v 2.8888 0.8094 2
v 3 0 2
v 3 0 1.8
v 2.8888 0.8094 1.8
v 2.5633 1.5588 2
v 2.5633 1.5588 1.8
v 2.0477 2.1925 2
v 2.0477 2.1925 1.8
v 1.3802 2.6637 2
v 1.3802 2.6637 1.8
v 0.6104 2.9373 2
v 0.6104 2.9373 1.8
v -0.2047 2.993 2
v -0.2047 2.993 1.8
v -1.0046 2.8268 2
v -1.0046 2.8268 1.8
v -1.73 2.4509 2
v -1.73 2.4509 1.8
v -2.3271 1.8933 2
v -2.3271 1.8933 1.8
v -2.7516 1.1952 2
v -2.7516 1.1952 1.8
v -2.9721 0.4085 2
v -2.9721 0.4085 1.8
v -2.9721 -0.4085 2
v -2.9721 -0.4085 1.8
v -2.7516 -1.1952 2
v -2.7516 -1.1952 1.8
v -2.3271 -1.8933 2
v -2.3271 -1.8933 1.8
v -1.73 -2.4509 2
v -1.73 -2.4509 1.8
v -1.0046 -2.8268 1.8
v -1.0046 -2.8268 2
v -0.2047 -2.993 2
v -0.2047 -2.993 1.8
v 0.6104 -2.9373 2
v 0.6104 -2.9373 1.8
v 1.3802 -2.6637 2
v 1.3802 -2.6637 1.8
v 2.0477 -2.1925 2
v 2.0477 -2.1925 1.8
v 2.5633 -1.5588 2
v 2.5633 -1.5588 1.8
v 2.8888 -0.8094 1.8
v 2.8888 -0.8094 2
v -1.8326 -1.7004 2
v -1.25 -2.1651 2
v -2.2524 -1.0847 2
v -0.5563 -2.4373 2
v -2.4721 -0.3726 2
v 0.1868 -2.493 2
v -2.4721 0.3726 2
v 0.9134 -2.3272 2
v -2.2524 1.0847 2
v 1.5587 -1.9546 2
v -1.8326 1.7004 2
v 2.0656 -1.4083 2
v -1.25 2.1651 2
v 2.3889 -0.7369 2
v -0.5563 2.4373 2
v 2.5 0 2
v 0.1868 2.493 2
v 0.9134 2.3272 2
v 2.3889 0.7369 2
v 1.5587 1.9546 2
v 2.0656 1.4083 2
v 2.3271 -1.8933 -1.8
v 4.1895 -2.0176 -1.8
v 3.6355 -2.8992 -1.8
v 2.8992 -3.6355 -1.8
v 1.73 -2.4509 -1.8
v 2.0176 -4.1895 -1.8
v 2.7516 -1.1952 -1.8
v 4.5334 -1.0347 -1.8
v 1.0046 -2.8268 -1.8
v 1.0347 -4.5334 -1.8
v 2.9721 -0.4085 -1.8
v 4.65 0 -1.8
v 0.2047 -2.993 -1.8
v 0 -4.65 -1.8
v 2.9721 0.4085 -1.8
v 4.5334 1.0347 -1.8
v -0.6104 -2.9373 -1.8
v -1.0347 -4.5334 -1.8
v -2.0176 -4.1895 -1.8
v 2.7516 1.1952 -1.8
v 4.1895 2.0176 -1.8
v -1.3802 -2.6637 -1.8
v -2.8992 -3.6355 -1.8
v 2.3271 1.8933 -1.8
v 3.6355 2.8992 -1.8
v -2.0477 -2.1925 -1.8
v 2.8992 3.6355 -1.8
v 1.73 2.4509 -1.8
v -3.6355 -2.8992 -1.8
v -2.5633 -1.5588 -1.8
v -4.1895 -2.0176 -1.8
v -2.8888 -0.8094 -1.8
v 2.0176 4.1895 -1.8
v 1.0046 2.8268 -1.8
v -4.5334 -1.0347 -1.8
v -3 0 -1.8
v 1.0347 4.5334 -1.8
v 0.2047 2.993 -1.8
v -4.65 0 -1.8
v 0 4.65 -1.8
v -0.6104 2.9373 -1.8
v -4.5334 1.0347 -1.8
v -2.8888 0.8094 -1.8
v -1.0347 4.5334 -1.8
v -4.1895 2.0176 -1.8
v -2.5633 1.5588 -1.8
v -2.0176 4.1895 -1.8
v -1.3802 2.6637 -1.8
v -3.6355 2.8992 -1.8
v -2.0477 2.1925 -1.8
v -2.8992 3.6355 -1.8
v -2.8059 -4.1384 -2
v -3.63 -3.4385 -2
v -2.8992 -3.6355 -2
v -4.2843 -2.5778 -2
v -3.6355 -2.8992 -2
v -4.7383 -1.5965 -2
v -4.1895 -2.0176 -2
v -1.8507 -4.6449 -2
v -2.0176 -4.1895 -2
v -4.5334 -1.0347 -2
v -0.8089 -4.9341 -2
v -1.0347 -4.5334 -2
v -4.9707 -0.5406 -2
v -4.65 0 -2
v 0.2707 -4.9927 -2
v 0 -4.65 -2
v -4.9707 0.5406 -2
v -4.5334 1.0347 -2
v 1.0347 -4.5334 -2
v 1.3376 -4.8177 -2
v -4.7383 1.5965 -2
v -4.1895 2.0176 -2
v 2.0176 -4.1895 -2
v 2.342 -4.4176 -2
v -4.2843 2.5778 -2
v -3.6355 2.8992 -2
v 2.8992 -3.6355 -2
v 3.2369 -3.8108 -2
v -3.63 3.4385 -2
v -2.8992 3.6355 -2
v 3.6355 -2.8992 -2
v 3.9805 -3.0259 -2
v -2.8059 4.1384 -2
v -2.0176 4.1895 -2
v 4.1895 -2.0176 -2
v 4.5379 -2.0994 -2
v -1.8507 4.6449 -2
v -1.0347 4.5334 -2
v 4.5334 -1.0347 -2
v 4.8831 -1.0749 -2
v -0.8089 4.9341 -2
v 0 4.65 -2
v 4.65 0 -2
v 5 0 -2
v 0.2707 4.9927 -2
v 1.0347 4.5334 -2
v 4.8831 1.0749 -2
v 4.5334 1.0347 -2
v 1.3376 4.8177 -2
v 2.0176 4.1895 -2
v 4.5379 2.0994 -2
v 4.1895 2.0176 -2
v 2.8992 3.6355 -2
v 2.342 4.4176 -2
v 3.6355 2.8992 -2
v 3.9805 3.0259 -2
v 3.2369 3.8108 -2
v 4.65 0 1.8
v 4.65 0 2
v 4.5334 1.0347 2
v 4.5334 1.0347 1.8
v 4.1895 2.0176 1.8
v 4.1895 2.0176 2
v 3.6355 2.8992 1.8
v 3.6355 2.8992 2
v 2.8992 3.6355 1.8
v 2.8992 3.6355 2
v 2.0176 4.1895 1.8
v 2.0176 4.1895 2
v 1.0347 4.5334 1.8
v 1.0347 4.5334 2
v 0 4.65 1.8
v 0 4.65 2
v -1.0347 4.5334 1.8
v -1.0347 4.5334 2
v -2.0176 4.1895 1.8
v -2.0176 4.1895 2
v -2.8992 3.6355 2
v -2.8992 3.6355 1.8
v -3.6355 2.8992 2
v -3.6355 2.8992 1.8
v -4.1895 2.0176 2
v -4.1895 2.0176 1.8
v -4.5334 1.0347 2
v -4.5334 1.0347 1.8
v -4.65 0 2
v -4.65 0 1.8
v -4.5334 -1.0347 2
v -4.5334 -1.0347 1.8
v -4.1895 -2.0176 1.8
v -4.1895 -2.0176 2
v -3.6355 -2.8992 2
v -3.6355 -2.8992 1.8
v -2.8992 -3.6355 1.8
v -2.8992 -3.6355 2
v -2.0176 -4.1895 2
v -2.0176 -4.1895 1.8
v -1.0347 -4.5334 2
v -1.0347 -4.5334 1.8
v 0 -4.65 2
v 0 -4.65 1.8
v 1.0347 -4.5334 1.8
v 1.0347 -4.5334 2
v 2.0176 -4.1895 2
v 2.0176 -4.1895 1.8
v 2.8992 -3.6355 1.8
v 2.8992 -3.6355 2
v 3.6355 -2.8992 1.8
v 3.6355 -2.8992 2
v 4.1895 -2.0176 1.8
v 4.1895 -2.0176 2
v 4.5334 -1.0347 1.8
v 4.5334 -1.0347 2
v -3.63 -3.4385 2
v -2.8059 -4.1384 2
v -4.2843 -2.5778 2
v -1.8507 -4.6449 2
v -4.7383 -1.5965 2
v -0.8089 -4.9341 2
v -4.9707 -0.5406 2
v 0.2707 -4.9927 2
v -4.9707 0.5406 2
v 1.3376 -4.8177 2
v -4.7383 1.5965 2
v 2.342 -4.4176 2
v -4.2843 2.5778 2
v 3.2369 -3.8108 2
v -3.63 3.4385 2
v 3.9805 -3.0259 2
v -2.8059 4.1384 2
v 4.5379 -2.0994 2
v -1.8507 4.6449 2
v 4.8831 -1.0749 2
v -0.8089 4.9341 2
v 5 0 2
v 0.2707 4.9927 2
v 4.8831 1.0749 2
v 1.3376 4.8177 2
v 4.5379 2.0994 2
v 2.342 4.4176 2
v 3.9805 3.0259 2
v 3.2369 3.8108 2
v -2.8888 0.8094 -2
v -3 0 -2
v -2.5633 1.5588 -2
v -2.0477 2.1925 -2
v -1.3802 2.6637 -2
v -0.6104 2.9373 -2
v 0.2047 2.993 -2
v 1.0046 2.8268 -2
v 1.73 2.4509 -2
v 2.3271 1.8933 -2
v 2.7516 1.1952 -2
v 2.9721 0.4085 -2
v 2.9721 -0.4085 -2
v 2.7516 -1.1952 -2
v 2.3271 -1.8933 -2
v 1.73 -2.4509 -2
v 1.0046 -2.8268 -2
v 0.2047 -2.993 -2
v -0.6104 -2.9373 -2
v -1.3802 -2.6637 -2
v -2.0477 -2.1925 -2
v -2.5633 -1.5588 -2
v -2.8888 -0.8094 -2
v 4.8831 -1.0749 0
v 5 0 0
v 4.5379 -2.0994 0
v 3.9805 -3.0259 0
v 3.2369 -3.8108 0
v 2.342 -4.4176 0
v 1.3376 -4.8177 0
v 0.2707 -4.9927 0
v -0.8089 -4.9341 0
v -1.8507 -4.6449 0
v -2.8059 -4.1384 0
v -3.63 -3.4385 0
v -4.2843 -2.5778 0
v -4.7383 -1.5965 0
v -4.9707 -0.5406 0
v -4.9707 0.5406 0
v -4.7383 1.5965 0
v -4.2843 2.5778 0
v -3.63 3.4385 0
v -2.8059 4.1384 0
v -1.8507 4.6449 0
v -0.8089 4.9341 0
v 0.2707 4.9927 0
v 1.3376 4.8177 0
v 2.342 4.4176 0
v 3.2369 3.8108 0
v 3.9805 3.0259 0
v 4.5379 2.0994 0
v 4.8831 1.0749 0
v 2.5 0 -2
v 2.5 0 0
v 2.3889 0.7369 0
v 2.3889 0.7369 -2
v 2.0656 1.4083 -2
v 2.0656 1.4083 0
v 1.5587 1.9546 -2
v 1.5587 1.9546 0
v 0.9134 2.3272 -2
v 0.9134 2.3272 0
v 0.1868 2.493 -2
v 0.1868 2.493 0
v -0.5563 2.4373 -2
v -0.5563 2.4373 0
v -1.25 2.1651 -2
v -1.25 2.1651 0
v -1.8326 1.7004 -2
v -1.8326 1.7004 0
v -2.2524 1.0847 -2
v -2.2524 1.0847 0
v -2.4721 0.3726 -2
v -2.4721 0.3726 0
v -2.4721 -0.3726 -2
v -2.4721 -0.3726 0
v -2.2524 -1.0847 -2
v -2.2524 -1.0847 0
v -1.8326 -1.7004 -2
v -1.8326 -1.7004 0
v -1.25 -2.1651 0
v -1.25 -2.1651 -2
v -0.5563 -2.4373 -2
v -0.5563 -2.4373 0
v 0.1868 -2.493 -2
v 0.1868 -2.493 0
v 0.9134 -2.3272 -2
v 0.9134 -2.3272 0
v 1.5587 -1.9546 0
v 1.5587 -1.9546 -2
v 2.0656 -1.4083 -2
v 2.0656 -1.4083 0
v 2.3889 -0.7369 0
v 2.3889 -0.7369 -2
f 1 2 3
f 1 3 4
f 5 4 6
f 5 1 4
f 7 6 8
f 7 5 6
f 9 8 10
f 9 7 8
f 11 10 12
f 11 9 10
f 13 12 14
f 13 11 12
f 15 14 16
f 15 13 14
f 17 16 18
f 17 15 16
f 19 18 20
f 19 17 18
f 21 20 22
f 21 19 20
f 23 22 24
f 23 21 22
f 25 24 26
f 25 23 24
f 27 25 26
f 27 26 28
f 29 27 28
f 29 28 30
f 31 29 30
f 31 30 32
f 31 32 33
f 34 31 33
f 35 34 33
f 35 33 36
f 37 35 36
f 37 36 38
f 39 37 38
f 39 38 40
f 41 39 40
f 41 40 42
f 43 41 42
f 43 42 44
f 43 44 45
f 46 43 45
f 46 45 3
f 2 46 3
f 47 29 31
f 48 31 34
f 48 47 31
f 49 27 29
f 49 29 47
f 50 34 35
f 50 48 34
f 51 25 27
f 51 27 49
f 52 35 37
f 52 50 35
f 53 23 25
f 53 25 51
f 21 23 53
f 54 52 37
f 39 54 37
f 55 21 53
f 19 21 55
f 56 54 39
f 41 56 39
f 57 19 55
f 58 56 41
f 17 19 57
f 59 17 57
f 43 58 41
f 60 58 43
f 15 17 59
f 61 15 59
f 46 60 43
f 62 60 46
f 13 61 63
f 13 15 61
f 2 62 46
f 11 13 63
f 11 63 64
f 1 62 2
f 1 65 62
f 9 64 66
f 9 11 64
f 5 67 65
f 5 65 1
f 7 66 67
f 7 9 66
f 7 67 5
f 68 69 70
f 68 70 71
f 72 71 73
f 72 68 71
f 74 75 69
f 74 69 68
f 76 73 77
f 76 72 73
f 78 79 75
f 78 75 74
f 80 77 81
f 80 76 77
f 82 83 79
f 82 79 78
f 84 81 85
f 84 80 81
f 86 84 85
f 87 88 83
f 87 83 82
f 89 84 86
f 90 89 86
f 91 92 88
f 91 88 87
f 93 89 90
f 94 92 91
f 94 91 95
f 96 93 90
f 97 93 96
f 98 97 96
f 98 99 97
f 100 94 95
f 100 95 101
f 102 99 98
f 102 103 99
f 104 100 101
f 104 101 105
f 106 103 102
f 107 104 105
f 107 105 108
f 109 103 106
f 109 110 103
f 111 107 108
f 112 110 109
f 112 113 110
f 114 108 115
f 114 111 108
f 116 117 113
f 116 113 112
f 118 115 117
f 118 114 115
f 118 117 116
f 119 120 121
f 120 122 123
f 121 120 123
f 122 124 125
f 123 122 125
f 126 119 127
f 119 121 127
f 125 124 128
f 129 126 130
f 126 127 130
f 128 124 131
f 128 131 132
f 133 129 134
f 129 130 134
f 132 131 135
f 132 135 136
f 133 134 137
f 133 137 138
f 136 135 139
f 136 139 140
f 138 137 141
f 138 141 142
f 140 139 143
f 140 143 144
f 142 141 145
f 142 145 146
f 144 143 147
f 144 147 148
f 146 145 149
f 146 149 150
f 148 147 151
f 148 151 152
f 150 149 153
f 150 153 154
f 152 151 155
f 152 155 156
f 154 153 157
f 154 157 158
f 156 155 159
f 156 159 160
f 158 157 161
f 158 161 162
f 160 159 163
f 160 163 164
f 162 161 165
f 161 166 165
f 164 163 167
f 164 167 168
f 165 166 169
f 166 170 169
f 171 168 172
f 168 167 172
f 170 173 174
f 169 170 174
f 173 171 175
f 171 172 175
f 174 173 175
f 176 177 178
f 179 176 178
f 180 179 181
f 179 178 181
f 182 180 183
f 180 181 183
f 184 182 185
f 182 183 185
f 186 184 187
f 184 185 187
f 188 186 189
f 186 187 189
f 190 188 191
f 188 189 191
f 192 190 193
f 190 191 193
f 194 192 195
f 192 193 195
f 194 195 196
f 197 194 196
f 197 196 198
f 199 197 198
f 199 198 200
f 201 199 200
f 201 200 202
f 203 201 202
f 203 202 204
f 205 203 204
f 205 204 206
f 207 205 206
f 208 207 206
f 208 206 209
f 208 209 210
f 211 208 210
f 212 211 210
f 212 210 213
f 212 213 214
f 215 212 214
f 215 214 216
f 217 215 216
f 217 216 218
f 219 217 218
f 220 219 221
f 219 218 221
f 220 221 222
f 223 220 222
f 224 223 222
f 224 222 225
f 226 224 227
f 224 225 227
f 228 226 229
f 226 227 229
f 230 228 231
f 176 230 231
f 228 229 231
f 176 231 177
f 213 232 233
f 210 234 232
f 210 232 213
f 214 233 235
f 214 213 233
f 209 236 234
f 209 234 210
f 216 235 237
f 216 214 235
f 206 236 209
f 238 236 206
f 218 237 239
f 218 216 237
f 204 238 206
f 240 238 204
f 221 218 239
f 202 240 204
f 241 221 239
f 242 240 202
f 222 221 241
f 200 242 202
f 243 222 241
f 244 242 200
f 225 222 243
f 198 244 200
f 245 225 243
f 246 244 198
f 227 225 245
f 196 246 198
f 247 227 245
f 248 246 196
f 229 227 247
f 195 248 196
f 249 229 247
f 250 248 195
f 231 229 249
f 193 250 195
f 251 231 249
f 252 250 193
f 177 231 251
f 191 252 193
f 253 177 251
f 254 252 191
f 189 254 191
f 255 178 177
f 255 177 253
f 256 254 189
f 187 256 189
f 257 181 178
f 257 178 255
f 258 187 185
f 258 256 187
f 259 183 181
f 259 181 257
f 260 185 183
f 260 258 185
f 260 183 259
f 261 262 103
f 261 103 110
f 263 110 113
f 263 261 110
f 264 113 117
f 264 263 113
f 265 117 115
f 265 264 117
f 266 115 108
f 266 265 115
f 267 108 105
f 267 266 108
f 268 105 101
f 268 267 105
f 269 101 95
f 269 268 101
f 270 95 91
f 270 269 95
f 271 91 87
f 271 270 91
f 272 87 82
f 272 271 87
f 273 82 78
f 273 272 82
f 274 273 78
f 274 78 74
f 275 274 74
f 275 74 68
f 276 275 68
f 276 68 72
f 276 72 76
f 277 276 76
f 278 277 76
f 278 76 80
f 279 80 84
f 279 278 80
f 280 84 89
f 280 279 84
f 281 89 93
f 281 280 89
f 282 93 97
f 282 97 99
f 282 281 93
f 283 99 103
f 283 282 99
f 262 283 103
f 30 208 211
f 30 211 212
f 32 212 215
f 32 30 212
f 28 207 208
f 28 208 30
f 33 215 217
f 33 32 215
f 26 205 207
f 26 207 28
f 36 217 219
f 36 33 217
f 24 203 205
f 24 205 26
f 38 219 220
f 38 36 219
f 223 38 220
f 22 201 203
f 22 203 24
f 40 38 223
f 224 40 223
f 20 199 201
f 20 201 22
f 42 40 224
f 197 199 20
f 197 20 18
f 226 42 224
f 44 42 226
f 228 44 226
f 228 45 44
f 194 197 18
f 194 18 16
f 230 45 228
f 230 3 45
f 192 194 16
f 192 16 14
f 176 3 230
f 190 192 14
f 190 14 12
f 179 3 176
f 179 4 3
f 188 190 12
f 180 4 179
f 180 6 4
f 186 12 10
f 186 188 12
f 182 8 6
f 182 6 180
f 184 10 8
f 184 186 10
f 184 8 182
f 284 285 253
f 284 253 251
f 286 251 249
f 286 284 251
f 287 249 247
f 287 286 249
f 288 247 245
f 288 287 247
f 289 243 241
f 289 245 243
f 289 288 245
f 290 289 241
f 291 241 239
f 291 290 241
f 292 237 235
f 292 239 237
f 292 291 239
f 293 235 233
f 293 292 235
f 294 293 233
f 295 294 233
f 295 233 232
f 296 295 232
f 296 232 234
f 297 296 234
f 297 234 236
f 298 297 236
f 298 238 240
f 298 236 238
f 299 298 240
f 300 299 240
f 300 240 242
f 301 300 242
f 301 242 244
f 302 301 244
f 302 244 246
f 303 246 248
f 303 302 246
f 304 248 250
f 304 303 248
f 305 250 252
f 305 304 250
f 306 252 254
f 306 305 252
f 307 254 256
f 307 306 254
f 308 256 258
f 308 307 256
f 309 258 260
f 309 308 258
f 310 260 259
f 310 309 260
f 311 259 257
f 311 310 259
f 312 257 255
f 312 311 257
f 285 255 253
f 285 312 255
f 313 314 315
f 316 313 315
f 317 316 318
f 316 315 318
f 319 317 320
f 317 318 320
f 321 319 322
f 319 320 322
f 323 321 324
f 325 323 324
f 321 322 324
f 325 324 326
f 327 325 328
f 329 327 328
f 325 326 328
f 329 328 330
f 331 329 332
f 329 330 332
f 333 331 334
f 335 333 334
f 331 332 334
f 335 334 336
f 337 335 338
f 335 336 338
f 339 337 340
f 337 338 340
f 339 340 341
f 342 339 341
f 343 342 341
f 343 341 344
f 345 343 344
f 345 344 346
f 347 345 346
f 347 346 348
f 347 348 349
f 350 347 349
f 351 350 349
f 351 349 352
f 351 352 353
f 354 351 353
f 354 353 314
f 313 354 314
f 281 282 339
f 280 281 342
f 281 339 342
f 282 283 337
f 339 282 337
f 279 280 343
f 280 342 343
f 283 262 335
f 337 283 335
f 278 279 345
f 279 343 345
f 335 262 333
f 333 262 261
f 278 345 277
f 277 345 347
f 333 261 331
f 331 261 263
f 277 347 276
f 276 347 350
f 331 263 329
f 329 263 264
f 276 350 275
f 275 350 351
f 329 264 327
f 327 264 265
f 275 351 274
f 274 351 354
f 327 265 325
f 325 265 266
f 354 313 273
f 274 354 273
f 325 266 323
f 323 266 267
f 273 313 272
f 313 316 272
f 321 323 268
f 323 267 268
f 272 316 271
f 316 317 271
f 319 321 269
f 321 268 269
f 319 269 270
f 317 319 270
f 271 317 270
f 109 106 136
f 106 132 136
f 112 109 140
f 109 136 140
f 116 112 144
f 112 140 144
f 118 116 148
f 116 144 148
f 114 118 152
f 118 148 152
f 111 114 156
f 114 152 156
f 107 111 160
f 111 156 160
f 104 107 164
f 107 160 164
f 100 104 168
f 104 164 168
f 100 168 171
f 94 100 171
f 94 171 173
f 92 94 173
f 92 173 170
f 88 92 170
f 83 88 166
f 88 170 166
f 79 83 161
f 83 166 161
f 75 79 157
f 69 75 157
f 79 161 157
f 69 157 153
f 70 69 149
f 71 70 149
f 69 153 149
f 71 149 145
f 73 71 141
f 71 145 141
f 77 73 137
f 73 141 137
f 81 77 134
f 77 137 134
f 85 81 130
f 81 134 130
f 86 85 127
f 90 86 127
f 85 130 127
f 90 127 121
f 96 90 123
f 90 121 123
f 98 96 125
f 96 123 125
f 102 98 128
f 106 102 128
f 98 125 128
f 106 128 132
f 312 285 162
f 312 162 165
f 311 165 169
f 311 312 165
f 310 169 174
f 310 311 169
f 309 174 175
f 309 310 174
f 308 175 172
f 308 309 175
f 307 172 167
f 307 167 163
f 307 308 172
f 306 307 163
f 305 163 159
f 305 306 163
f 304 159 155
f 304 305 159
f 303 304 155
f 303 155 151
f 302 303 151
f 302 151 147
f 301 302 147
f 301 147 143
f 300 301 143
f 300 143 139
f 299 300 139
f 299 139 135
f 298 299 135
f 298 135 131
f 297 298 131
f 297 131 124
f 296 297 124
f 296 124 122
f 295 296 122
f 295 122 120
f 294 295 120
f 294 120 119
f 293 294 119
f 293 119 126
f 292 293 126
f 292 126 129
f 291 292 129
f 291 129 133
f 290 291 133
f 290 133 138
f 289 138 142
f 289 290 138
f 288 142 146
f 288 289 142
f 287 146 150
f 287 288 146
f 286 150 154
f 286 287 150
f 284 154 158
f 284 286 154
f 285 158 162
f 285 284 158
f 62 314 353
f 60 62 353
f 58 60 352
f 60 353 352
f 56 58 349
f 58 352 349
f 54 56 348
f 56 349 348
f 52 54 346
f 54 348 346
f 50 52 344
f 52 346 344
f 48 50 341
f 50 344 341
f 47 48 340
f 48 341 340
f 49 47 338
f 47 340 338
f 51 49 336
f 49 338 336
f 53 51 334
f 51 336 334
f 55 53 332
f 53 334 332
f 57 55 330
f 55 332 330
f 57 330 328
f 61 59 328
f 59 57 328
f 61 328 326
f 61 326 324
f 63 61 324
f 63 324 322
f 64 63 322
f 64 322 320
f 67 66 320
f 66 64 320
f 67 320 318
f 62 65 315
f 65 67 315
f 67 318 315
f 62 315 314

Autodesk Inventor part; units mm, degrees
ref_plane "YZ Plane" through (0, 0, 0) normal (1, 0, 0) x (0, 1, 0)
ref_plane "XZ Plane" through (0, 0, 0) normal (0, 1, 0) x (-1, 0, 0)
ref_plane "XY Plane" through (0, 0, 0) normal (0, 0, 1) x (1, 0, 0)
sketch "Эскиз1" plane through (0, 0, 0) normal (0, 0, 1) x (1, 0, 0)
  circle A0 centre (0, 0) radius 2.5
  circle A1 centre (0, 0) radius 5
  dimension "d0" = 5
  dimension "d1" = 10
extrude "Выдавливание1" add sketch "Эскиз1" along normal mid plane 4
sketch "Эскиз2" plane through (0, 0, 2) normal (0, 0, 1) x (1, 0, 0)
  circle A0 centre (0, 0) radius 4.65
  circle A1 centre (0, 0) radius 3
  dimension "d4" = 9.3
  dimension "d5" = 6
extrude "Выдавливание2" cut sketch "Эскиз2" against normal blind 0.2
sketch "Эскиз3" plane through (0, 0, -2) normal (0, 0, -1) x (-1, 0, 0)
  circle A0 centre (0, 0) radius 3
  circle A1 centre (0, 0) radius 4.65
  dimension "d8" = 6
  dimension "d9" = 9.3
extrude "Выдавливание3" cut sketch "Эскиз3" against normal blind 0.2
properties part number "mr105zz"
